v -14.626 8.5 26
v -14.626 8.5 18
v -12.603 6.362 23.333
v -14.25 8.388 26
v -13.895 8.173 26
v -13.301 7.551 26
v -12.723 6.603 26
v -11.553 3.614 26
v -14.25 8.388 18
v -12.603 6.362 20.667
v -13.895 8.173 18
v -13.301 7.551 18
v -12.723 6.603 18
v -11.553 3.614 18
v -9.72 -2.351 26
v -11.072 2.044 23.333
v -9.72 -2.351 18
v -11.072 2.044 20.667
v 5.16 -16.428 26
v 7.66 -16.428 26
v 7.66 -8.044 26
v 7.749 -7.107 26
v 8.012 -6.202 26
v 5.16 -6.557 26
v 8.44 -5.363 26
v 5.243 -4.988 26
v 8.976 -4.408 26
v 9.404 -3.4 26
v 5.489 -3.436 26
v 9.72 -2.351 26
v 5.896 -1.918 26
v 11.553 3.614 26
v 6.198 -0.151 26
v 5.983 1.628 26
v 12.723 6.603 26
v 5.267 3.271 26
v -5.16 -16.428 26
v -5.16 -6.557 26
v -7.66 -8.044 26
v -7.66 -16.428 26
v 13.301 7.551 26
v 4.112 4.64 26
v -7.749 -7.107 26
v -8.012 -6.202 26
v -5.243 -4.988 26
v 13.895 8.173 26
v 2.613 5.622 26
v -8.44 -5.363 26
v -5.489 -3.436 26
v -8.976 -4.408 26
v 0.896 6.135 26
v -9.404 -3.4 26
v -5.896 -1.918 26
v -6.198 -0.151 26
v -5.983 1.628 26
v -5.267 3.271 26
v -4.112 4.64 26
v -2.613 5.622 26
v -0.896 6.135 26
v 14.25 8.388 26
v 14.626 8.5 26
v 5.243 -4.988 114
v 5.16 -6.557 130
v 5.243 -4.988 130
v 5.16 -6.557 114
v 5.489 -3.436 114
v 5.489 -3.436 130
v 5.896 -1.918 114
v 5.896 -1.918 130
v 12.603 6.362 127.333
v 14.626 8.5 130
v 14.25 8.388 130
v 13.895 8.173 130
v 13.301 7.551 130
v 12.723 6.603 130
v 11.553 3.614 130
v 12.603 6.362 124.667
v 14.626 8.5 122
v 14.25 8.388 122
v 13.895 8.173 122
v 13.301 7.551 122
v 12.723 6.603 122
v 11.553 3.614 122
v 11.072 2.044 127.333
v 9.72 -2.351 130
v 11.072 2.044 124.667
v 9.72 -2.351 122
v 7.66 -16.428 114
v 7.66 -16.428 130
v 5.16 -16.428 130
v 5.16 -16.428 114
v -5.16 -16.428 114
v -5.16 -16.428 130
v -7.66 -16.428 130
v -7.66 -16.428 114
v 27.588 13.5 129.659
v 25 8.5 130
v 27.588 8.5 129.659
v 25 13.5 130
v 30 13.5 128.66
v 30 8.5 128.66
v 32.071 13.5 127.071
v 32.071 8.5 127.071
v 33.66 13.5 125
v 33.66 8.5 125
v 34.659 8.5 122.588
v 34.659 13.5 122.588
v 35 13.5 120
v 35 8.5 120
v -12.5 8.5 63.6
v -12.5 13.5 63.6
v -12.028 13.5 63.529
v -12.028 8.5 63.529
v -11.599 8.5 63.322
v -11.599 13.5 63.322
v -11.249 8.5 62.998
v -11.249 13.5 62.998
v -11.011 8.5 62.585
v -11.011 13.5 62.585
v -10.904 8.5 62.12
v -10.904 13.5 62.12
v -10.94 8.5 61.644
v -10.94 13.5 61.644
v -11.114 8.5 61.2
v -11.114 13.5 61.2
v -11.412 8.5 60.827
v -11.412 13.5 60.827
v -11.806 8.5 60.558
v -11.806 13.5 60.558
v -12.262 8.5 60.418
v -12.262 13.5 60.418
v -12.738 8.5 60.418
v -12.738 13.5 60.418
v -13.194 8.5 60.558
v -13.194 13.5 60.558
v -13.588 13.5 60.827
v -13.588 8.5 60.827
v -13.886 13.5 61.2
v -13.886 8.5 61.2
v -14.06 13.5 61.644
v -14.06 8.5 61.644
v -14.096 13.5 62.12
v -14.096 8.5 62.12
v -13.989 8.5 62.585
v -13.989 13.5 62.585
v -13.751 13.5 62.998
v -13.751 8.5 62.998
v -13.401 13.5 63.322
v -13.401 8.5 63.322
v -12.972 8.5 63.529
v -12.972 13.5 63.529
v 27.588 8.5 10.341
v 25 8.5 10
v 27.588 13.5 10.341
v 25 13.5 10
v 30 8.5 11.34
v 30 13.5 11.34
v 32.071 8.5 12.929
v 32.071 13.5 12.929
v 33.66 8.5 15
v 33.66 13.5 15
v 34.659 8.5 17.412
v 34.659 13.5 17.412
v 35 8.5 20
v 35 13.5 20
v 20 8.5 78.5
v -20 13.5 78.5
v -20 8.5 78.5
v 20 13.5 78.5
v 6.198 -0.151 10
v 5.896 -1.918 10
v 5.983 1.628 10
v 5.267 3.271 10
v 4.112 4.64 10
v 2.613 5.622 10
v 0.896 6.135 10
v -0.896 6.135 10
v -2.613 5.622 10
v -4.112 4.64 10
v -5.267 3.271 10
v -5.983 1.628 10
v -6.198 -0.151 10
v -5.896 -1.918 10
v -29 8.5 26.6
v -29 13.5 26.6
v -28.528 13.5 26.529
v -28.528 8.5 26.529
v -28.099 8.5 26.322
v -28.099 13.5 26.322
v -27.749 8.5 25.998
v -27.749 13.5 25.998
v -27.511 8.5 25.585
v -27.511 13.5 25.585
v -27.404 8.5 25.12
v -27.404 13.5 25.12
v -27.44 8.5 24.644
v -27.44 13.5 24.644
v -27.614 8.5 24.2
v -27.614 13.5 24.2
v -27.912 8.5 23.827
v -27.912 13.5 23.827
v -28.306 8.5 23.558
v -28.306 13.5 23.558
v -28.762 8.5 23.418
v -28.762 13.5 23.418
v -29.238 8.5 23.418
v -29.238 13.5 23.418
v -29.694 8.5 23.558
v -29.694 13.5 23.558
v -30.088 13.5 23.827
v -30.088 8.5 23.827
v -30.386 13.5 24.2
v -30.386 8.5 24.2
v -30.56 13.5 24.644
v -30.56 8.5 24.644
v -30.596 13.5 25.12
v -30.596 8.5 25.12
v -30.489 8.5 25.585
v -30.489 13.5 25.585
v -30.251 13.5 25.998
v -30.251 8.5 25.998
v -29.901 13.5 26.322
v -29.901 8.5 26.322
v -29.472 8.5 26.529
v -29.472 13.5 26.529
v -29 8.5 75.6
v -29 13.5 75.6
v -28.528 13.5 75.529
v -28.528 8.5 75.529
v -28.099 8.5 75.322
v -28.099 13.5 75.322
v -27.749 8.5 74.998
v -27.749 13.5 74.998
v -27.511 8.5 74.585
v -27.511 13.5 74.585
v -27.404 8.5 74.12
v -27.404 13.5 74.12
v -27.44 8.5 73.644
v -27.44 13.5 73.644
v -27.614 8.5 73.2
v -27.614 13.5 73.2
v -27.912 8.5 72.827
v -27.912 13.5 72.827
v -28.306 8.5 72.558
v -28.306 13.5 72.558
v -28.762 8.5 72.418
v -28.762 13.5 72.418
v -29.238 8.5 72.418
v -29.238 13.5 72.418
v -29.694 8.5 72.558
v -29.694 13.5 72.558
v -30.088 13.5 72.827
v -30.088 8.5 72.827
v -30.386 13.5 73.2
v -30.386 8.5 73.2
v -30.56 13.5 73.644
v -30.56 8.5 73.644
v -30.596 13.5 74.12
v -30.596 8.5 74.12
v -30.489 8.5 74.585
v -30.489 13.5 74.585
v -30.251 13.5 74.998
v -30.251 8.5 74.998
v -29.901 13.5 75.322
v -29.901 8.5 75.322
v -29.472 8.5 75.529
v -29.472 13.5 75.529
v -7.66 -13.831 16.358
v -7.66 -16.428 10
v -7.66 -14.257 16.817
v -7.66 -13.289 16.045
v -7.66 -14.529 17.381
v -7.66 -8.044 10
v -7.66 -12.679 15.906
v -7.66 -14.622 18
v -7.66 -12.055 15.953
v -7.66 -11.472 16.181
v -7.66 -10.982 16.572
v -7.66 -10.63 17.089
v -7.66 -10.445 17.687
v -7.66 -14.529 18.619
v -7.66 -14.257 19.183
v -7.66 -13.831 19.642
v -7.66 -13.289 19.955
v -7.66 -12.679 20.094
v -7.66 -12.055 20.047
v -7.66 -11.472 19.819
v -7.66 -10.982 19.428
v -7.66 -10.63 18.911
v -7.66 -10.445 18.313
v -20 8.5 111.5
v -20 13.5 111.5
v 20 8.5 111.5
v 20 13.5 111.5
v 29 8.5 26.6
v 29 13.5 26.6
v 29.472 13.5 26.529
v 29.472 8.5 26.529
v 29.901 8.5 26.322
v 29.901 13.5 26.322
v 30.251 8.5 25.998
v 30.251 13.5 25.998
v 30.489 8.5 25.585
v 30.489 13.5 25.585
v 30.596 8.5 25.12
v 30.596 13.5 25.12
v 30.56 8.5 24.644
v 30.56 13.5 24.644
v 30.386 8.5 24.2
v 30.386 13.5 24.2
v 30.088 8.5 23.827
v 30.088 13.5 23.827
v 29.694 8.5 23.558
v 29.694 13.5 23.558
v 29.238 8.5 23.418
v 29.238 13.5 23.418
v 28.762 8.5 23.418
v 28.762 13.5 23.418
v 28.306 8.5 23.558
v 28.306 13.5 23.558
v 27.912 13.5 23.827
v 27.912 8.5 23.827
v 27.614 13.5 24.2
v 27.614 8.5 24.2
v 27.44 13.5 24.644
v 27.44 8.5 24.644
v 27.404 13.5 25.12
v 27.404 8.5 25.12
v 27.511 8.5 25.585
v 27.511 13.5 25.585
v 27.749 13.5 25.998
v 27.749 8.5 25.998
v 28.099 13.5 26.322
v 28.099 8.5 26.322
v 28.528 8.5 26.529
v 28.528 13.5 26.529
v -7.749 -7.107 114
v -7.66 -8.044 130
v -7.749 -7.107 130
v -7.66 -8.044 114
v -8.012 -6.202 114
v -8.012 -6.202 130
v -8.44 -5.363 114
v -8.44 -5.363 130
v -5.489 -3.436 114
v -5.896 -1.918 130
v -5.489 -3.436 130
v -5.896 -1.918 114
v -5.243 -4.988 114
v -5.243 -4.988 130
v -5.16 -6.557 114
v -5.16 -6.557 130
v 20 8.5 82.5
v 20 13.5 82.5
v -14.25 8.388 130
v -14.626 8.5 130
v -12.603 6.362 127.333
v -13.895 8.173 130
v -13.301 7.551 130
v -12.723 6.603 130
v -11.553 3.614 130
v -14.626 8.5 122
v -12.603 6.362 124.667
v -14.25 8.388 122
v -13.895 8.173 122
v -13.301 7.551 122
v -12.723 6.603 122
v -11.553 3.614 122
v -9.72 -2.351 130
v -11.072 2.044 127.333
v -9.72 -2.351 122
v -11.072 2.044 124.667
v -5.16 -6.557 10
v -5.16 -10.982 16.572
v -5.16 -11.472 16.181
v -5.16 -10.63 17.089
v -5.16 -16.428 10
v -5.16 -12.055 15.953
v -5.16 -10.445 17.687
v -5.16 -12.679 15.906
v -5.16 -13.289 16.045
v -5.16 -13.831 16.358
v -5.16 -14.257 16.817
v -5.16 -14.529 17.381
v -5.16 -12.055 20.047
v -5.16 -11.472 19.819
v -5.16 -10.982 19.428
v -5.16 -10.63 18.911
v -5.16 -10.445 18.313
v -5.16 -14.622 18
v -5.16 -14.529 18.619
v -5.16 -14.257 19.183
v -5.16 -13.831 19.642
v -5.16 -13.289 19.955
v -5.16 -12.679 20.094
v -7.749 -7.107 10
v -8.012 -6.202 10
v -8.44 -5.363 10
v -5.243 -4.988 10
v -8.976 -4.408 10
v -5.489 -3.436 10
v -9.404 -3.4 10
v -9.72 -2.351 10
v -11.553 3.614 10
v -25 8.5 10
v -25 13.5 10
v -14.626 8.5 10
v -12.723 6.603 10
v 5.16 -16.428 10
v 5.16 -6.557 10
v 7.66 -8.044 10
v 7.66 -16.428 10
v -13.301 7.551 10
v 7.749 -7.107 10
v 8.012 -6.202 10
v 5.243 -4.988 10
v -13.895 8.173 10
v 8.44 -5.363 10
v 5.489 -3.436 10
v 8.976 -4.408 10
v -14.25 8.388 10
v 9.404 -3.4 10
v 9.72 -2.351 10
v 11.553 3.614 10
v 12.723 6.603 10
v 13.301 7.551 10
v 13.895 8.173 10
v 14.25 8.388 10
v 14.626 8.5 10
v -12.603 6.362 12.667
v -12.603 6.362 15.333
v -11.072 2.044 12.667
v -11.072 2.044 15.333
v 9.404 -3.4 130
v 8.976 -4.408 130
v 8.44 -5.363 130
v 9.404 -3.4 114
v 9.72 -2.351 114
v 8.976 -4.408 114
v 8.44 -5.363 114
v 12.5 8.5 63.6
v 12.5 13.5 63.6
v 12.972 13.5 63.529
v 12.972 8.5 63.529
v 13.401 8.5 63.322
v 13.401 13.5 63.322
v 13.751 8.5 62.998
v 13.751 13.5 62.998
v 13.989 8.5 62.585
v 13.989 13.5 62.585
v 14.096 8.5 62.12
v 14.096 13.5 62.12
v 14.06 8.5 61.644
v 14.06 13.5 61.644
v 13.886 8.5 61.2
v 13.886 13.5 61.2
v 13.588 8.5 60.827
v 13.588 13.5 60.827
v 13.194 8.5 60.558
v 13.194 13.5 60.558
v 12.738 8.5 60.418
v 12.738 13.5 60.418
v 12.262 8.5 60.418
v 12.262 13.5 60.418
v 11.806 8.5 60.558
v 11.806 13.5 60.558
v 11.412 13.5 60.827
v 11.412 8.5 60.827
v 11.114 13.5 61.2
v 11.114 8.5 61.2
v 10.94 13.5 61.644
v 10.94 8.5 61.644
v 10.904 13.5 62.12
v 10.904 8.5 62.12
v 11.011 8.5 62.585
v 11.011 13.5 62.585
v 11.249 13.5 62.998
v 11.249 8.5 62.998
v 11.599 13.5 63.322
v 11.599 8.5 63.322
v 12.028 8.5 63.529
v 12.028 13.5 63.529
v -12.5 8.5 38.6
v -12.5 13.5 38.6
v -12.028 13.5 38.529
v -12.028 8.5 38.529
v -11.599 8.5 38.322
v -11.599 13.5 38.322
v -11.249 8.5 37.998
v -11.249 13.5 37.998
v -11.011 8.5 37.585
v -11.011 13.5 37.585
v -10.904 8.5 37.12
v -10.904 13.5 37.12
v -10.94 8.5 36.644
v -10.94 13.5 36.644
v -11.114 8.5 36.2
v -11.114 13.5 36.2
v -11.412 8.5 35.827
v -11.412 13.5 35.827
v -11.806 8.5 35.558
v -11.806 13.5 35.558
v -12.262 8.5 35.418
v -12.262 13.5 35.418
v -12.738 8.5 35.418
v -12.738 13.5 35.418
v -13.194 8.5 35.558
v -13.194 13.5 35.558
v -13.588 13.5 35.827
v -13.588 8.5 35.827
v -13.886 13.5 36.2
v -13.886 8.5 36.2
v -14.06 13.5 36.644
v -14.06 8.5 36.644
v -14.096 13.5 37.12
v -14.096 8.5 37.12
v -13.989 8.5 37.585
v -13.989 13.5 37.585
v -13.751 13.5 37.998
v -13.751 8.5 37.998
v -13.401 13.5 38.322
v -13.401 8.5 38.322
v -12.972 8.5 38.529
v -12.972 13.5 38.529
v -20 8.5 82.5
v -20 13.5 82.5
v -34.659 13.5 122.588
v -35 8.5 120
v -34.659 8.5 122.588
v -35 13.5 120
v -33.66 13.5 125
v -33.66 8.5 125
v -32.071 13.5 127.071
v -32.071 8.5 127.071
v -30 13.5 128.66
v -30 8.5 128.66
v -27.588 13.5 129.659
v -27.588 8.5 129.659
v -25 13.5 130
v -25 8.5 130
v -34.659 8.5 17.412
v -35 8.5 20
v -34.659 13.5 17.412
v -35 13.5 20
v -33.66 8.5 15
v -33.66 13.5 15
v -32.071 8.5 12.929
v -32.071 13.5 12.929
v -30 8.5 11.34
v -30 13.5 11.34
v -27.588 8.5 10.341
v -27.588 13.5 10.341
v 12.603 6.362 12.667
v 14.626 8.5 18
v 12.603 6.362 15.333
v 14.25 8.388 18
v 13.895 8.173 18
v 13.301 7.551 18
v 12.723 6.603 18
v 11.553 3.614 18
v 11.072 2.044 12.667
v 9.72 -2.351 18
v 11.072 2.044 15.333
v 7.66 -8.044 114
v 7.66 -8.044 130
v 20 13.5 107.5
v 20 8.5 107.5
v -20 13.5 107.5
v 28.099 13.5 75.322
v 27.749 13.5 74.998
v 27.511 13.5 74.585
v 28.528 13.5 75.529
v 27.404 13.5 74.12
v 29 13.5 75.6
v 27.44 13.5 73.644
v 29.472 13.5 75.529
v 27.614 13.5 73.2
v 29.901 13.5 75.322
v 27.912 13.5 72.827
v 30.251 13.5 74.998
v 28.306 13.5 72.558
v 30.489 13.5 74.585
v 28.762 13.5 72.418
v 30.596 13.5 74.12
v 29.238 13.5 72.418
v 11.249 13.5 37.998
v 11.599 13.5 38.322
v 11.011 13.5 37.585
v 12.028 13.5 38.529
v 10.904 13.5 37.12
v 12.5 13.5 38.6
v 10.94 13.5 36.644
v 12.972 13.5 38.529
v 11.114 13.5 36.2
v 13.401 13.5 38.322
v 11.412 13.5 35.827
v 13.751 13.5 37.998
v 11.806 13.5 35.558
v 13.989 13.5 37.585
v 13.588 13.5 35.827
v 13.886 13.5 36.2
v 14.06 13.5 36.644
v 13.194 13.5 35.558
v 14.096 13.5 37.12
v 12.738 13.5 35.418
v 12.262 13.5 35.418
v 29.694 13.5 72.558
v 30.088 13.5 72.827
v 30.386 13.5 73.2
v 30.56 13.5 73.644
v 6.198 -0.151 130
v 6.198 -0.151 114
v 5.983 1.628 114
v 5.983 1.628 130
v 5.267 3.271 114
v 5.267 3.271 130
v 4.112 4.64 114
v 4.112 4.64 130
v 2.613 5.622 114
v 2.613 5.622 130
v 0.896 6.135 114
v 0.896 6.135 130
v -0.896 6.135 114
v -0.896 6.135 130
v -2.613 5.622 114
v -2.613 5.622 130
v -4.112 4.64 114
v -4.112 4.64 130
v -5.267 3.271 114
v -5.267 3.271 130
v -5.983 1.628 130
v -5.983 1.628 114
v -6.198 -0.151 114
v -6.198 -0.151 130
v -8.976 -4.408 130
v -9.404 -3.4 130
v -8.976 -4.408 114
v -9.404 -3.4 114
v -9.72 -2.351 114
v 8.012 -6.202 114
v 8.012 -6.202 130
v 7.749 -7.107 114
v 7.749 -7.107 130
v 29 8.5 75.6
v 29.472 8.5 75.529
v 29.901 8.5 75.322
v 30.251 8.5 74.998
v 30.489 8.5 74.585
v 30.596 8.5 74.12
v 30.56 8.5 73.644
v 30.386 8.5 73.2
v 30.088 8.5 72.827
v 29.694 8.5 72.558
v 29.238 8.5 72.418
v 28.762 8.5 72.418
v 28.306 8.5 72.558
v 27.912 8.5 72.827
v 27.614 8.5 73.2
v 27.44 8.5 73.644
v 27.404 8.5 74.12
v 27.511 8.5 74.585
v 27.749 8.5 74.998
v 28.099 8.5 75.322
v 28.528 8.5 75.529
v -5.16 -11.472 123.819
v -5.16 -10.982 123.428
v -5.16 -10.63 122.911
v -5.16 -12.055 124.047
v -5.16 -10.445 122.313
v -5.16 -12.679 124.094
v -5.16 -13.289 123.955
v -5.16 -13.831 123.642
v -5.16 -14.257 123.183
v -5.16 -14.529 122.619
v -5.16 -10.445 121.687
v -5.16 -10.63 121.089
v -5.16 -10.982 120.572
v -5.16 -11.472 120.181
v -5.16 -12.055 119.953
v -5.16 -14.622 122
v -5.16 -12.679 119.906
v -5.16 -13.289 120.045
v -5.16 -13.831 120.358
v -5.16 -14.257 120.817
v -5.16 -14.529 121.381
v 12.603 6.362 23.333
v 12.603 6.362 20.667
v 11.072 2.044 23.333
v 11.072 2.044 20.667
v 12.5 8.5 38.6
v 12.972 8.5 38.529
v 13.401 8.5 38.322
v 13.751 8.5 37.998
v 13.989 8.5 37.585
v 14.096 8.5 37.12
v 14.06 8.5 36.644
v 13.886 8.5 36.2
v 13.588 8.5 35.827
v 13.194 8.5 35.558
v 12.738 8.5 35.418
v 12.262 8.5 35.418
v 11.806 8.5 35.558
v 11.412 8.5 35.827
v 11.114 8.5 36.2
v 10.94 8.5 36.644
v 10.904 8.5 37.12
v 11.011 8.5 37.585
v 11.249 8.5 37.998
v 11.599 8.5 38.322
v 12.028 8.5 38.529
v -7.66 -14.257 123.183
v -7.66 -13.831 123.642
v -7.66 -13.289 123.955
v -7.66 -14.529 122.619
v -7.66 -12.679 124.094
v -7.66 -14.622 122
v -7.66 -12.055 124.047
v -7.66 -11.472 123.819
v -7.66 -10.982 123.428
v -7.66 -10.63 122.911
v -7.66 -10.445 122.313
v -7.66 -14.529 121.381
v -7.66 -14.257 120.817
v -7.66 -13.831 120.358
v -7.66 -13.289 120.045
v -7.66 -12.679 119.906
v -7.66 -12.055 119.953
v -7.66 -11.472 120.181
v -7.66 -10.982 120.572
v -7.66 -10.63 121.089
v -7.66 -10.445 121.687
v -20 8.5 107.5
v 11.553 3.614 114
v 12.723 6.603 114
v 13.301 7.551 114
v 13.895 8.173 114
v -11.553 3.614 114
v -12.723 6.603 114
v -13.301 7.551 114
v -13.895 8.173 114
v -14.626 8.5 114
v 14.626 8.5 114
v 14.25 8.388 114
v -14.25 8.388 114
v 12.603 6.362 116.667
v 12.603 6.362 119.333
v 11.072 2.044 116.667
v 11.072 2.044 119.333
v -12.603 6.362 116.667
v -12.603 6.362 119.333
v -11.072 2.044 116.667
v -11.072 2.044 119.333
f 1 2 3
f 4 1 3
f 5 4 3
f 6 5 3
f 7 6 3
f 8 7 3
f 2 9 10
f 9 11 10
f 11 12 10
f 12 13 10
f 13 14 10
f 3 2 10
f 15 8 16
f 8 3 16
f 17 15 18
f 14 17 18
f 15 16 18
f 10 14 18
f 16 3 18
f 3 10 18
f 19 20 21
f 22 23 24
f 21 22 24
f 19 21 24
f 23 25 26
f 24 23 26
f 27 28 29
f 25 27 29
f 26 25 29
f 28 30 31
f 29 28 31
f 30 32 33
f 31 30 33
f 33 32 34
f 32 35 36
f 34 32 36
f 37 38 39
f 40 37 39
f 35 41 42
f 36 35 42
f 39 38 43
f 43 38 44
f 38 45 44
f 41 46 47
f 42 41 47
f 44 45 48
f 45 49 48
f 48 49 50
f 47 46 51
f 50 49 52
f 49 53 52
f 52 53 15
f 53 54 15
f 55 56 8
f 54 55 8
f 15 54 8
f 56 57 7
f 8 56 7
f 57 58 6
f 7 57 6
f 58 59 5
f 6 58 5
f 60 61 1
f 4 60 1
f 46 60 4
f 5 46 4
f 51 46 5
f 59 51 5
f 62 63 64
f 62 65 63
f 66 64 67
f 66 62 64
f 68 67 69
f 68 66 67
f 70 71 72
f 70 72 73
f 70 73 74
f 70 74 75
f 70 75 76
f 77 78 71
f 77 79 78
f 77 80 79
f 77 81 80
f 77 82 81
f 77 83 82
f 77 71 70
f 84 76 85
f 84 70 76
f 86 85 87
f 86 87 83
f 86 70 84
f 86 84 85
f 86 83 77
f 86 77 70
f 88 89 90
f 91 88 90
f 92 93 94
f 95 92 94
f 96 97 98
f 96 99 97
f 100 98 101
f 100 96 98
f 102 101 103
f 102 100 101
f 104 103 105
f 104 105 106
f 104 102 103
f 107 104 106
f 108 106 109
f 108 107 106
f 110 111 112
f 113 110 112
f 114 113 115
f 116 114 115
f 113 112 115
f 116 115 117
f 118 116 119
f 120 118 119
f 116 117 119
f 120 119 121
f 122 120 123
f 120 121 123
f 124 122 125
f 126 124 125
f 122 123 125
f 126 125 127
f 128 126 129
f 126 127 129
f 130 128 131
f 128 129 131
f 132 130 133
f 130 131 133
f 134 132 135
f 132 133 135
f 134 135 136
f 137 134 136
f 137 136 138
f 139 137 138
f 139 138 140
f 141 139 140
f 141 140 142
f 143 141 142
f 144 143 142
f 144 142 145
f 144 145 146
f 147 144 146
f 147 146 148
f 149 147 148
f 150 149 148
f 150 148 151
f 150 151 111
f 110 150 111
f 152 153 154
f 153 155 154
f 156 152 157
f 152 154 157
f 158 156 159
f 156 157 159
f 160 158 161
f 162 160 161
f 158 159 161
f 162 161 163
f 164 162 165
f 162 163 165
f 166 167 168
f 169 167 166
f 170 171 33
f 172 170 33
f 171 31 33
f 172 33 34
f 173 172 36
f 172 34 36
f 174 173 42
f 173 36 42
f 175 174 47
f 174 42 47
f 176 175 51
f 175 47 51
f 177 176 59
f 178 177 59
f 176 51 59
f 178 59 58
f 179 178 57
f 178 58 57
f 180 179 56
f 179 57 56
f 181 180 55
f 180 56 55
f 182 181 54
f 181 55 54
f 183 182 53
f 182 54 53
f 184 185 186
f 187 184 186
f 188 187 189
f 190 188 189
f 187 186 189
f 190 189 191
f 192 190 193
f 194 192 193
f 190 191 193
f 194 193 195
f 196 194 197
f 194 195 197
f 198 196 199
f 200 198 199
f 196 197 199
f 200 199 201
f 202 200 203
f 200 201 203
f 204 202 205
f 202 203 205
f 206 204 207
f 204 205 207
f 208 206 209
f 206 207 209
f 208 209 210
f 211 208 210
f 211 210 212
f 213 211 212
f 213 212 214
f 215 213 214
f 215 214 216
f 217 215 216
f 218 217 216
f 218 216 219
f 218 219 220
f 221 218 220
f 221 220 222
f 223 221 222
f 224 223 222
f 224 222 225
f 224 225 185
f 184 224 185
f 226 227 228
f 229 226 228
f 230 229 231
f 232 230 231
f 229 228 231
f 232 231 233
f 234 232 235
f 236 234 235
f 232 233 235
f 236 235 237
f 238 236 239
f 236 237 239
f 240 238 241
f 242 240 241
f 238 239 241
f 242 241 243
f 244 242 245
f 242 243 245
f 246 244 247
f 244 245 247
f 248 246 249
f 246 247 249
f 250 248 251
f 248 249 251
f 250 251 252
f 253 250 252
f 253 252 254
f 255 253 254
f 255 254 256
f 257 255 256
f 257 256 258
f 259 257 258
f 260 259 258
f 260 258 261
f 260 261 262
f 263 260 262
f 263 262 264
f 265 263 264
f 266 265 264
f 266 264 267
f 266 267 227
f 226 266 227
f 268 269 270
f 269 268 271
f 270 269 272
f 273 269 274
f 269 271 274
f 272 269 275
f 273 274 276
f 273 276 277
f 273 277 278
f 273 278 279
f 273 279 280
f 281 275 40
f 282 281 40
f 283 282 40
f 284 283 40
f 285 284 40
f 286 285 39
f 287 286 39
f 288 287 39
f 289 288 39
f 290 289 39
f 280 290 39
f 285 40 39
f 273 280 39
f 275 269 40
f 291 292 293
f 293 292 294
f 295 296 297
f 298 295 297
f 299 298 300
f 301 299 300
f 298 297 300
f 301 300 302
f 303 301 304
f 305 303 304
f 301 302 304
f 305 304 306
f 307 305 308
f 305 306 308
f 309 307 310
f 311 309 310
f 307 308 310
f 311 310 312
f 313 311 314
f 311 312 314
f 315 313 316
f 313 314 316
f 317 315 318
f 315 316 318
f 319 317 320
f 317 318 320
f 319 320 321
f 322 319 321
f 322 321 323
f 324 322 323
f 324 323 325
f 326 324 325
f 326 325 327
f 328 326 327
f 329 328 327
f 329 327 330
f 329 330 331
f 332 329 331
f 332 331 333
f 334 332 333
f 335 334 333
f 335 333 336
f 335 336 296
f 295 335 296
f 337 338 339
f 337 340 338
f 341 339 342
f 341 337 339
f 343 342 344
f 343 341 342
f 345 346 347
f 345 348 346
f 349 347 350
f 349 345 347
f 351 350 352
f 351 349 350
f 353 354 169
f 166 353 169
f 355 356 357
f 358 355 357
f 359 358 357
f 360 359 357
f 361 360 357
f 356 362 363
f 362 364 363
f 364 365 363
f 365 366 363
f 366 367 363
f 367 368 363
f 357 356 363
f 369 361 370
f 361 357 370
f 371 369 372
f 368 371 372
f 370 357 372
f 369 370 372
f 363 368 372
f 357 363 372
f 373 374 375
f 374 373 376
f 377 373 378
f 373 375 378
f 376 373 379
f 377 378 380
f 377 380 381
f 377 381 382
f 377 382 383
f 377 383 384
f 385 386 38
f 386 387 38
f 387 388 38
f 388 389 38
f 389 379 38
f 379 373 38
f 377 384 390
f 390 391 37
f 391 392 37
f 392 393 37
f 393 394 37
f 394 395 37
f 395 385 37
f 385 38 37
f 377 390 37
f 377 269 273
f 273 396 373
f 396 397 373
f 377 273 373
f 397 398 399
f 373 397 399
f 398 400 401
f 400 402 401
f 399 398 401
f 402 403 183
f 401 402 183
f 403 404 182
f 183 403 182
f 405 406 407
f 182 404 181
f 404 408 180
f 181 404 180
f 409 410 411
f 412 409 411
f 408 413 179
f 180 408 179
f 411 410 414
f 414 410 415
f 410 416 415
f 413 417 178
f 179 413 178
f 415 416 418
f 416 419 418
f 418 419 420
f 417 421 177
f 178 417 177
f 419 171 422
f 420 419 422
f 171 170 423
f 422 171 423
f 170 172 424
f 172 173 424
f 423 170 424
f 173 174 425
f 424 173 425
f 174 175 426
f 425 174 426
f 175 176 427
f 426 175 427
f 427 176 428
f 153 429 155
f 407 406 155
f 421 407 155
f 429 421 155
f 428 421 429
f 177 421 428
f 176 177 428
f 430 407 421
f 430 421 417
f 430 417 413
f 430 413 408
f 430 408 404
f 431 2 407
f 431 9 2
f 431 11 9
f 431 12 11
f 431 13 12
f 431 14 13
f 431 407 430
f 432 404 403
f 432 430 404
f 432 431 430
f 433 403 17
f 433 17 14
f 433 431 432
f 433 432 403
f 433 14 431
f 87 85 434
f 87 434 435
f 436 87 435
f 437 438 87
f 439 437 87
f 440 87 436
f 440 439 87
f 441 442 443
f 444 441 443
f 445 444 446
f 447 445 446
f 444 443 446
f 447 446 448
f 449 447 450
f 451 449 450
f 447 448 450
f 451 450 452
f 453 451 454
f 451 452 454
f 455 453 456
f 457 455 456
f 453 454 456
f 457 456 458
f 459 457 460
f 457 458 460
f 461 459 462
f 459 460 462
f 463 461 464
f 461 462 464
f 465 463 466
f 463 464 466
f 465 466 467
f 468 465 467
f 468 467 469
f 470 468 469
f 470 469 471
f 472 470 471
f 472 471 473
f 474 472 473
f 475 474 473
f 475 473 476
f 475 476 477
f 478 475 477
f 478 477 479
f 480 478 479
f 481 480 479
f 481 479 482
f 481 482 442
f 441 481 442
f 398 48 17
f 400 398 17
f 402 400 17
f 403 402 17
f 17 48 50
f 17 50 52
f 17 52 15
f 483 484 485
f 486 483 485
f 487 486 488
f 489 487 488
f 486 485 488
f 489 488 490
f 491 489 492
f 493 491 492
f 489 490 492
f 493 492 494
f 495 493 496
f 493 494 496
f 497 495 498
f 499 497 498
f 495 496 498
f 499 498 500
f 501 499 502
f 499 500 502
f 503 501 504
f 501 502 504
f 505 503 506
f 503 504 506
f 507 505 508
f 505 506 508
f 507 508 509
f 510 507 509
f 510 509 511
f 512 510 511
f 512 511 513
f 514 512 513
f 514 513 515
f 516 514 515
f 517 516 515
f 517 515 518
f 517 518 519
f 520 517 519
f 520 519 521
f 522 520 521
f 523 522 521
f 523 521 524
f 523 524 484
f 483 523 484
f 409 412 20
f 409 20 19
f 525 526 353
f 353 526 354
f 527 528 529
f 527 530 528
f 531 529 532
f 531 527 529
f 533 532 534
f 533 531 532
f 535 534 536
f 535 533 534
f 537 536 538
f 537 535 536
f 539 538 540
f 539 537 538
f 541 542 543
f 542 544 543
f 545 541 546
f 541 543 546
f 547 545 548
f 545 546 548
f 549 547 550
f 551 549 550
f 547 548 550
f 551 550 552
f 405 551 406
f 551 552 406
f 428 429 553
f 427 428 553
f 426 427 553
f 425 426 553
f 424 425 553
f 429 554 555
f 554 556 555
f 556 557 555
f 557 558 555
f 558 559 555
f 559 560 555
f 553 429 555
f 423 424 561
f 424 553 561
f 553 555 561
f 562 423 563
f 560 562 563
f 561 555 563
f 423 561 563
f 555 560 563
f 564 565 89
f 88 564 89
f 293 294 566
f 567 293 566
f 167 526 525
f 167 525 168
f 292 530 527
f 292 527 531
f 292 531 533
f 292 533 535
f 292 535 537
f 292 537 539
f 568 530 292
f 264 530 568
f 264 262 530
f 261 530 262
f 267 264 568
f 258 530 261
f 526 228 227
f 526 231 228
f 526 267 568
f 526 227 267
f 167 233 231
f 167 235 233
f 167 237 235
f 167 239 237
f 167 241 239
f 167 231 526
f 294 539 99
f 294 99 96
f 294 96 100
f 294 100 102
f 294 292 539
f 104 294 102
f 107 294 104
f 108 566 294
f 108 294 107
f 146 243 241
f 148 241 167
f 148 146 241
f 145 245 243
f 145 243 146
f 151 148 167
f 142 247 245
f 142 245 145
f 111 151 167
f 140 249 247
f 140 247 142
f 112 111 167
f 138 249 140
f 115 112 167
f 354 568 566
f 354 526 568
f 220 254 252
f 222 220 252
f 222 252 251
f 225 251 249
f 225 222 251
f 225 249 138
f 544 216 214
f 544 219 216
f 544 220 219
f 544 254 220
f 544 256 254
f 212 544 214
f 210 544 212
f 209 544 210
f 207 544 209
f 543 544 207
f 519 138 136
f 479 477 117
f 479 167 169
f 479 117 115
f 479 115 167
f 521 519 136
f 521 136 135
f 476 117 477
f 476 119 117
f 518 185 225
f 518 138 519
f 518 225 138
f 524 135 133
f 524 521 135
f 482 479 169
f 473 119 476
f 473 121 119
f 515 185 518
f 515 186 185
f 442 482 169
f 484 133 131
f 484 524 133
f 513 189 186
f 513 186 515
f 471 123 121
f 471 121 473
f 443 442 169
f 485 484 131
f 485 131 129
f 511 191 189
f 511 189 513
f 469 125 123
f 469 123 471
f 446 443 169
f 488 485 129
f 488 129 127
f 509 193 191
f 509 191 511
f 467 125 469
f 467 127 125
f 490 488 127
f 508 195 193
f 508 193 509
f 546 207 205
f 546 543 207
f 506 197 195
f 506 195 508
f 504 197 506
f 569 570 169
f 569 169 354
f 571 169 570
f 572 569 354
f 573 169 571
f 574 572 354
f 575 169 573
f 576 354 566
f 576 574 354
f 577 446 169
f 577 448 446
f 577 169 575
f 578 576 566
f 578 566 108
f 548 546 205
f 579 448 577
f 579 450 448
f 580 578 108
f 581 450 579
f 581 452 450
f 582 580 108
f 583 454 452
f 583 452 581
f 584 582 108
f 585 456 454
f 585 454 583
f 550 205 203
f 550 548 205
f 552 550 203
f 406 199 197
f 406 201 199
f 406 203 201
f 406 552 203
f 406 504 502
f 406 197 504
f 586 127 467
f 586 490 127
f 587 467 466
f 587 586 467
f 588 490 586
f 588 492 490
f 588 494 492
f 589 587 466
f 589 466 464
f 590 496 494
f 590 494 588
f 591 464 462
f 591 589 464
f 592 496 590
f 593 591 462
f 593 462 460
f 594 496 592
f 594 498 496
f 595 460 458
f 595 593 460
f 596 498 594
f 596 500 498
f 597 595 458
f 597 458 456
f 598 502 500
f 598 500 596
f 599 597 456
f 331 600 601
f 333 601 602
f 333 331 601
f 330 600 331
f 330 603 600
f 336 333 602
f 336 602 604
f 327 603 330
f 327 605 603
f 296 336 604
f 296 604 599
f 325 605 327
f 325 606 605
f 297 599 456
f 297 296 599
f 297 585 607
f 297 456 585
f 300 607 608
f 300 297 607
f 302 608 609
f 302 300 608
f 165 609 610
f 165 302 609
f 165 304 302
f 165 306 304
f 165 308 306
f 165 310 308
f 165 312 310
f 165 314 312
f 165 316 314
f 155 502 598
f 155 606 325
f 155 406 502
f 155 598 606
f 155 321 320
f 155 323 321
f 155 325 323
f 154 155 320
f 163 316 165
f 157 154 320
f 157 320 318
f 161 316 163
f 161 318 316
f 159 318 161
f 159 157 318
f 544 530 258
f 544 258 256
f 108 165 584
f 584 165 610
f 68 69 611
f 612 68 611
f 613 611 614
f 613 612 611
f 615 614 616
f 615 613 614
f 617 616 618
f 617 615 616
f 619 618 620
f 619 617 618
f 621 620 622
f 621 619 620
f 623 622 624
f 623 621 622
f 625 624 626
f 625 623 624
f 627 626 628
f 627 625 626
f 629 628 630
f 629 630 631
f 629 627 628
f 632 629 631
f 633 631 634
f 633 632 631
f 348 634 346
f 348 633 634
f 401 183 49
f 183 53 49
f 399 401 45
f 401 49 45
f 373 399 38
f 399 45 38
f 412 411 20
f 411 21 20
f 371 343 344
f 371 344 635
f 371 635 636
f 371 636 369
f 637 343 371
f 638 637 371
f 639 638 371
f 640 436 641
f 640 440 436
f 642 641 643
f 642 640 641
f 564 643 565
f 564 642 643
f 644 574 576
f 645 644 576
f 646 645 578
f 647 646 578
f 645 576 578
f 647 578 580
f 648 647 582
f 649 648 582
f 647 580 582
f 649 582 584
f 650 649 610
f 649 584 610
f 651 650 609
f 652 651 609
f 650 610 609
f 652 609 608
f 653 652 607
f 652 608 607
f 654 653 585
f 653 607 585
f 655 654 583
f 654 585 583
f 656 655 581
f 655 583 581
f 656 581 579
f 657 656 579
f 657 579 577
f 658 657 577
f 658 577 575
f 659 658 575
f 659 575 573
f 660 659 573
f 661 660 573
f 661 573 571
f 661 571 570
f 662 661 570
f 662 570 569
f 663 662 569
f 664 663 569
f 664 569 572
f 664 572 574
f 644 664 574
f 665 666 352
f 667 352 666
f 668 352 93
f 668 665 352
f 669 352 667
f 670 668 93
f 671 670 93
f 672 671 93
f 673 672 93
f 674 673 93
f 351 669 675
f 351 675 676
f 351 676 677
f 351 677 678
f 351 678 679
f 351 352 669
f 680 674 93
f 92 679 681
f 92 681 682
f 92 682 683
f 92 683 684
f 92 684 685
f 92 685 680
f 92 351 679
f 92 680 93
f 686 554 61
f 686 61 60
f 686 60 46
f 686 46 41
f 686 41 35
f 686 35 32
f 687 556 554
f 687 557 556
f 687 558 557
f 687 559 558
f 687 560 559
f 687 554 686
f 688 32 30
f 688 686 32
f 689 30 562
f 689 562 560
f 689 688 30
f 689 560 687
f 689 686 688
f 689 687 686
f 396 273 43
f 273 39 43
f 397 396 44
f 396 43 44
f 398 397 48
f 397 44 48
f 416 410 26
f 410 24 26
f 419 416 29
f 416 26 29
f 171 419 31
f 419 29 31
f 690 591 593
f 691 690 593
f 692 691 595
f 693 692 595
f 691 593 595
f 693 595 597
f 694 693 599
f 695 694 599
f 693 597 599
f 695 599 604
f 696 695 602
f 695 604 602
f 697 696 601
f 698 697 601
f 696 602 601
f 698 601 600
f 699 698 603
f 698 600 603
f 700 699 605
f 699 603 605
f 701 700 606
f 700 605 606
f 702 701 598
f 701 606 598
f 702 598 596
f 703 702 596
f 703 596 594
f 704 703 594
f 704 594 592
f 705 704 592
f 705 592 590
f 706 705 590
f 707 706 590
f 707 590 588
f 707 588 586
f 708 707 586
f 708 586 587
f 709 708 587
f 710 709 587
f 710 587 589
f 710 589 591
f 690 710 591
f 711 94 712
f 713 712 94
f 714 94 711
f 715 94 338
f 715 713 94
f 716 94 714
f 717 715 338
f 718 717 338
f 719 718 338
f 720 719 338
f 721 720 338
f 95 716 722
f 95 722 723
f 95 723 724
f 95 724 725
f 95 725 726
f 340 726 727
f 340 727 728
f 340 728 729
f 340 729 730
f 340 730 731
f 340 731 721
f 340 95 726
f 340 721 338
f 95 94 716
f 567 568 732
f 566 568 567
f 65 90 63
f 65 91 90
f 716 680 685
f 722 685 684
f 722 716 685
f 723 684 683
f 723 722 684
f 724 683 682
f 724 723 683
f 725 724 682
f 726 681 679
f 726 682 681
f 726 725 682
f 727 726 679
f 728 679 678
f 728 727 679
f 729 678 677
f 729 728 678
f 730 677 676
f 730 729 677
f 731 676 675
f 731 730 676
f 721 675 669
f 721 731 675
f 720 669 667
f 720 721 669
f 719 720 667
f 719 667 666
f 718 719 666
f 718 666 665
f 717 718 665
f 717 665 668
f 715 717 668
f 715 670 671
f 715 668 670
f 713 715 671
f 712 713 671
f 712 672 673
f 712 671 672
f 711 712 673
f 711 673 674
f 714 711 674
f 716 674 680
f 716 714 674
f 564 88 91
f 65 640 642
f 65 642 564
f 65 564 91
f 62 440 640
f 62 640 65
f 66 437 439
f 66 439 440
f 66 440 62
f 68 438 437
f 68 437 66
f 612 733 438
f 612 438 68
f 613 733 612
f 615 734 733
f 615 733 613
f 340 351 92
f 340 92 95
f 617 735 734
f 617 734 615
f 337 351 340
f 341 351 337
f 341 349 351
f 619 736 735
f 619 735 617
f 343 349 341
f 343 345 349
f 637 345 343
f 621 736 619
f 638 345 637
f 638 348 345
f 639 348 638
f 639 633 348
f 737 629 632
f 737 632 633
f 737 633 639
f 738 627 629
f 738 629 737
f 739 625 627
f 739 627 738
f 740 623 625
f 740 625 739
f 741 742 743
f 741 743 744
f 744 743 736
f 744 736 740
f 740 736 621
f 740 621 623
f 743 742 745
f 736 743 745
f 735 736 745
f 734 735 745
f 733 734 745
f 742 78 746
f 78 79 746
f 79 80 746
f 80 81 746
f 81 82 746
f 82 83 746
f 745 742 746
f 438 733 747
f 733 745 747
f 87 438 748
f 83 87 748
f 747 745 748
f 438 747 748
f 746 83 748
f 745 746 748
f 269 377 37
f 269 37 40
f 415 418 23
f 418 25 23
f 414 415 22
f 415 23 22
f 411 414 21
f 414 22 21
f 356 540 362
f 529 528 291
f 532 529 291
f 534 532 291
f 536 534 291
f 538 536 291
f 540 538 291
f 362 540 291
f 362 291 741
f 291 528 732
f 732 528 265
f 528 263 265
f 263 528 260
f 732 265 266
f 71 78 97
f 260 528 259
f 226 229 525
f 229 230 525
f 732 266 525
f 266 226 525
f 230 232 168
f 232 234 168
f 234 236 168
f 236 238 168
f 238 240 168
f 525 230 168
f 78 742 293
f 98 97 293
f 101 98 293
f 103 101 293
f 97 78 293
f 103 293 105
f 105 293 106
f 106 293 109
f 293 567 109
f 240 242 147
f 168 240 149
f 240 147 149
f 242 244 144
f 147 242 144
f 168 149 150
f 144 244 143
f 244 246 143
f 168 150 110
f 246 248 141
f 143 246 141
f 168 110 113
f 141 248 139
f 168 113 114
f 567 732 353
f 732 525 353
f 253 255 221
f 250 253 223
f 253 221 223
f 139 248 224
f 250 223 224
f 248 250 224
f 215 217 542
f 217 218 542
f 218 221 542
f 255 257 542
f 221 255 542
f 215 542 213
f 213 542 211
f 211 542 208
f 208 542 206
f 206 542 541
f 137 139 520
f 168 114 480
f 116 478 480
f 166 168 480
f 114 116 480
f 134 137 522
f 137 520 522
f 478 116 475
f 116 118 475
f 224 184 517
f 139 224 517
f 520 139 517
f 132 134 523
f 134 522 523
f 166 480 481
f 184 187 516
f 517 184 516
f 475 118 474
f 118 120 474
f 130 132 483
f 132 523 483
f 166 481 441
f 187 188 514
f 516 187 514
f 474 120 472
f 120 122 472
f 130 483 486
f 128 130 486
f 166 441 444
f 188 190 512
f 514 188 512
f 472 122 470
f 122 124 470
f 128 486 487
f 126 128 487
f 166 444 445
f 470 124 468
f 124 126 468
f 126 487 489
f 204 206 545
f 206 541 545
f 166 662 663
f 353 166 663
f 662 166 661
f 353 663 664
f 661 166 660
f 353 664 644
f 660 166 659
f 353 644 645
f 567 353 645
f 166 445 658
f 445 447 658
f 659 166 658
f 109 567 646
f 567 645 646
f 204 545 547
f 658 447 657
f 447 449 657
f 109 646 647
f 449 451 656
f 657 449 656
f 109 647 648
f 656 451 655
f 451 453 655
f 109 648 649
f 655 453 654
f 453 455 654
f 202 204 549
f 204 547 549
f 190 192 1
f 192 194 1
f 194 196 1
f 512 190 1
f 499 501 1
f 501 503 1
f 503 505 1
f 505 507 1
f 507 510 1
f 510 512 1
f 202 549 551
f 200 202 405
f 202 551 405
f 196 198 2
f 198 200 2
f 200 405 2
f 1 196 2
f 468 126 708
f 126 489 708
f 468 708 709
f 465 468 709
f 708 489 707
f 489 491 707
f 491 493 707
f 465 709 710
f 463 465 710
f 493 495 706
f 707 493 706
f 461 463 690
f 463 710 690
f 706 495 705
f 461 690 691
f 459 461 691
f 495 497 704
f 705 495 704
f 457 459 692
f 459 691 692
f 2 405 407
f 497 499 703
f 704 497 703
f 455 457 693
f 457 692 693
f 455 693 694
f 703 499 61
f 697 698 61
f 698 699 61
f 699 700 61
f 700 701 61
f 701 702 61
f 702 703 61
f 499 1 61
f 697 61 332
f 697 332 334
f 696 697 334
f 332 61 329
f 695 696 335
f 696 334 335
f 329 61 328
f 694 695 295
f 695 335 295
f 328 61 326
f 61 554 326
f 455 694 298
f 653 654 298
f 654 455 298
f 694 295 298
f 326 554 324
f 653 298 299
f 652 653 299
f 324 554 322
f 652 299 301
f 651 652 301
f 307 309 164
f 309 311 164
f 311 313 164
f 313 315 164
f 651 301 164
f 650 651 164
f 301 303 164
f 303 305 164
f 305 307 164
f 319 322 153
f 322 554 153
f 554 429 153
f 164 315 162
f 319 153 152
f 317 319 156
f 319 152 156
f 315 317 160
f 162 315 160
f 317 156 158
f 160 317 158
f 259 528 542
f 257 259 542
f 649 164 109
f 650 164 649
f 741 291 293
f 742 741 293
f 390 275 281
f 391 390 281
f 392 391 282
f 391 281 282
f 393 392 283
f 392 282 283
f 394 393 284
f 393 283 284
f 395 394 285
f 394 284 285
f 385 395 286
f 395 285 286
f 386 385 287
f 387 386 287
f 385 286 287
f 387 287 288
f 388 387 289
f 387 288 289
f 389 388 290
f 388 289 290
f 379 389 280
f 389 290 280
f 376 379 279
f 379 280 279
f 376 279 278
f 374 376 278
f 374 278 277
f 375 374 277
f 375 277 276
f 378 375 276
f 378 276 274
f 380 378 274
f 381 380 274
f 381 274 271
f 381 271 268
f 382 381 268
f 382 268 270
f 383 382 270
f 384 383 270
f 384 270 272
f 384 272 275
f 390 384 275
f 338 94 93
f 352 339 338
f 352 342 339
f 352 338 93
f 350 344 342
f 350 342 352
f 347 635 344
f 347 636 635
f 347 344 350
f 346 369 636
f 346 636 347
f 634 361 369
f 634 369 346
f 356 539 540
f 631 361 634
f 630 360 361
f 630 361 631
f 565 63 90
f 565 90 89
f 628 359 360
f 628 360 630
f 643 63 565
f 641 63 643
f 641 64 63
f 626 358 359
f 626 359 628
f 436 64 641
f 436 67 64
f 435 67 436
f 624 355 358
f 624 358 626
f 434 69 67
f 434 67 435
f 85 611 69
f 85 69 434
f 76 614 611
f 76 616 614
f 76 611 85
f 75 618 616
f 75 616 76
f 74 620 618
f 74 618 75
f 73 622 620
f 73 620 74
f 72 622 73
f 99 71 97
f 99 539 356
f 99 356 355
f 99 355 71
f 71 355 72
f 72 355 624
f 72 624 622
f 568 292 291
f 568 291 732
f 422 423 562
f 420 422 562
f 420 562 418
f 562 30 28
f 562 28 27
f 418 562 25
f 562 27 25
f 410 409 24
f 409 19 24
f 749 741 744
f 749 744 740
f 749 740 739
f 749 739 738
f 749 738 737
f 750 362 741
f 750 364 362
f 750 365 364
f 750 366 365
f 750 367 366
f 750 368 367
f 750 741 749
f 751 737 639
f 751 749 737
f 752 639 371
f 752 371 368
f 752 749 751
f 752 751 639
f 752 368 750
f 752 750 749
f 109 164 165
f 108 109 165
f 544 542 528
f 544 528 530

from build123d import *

# Parameters (mm, degrees)
BOSS_EXTRUDE2_START = 10
SKETCH3_W           = 70
SKETCH3_H           = 5
BOSS_EXTRUDE2_DEPTH = 120
BOSS_EXTRUDE3_START = 18
BOSS_EXTRUDE3_DEPTH = 8
SKETCH4_R           = 2.1
CUT_EXTRUDE1_DEPTH  = 11
FILLET1_R           = 10
SKETCH5_R           = 1.6
CUT_EXTRUDE2_DEPTH  = 11
CUT_EXTRUDE5_REACH  = 139.915
SKETCH7_R           = 1.6
CUT_EXTRUDE6_REACH  = 139.915
SKETCH6_W           = 40
SKETCH6_H           = 4


with BuildPart() as part:
    # Sketch3 → Boss-Extrude2 (new body)
    with BuildSketch(Plane.XY.offset(BOSS_EXTRUDE2_START)):
        with Locations((0, 11)):
            Rectangle(SKETCH3_W, SKETCH3_H)
    extrude(amount=BOSS_EXTRUDE2_DEPTH)

    # Sketch1 → Boss-Extrude3 (add, symmetric)
    with BuildSketch(Plane.XY.offset(BOSS_EXTRUDE3_START)):
        with BuildLine():
            Line((-14.625621312, 8.5), (14.625621312, 8.5))
            add(Edge.make_bspline(
                [(14.625621312, 8.5), (12.253002272, 8.152861079), (11.086674652, 1.382068579), (9.719671925, -2.351165174)],
                knots=[0, 0, 0, 0, 1, 1, 1, 1], degree=3))
            ThreePointArc((9.719671925, -2.351165174), (9.204012528, -3.909751064), (8.440296287, -5.362965465))
            ThreePointArc((8.440296287, -5.362965465), (7.859364307, -6.648156809), (7.660444431, -8.044448198))
            Line((7.660444431, -8.044448198), (7.660444431, -16.427876097))
            Line((7.660444431, -16.427876097), (6.160444431, -16.427876097))
            Line((6.160444431, -16.427876097), (5.160444431, -16.427876097))
            Line((5.160444431, -16.427876097), (5.160444431, -6.557170147))
            ThreePointArc((5.160444431, -6.557170147), (5.34546922, -4.208445066), (5.895979032, -1.917662968))
            ThreePointArc((5.895979032, -1.917662968), (0, 6.2), (-5.895979032, -1.917662968))
            ThreePointArc((-5.895979032, -1.917662968), (-5.34546922, -4.208445066), (-5.160444431, -6.557170147))
            Line((-5.160444431, -6.557170147), (-5.160444431, -16.427876097))
            Line((-5.160444431, -16.427876097), (-6.160444431, -16.427876097))
            Line((-6.160444431, -16.427876097), (-7.660444431, -16.427876097))
            Line((-7.660444431, -16.427876097), (-7.660444431, -8.044448198))
            ThreePointArc((-7.660444431, -8.044448198), (-7.859364307, -6.648156809), (-8.440296287, -5.362965465))
            ThreePointArc((-8.440296287, -5.362965465), (-9.204012528, -3.909751064), (-9.719671925, -2.351165174))
            add(Edge.make_bspline(
                [(-14.625621312, 8.5), (-12.253002272, 8.152861079), (-11.086674652, 1.382068579), (-9.719671925, -2.351165174)],
                knots=[0, 0, 0, 0, 1, 1, 1, 1], degree=3))
        make_face()
    boss_extrude3 = extrude(amount=BOSS_EXTRUDE3_DEPTH, both=True)

    # Sketch4 → Cut-Extrude1 (cut)
    with BuildSketch(Plane.ZY.offset(7.660444431)):
        with Locations(Location((18, -12.521824291, 0), (0, 0, 270))):
            Circle(SKETCH4_R)
    cut_extrude1 = extrude(amount=-CUT_EXTRUDE1_DEPTH, mode=Mode.SUBTRACT)

    # Mirror2: Boss-Extrude3, Cut-Extrude1 across plane
    add(boss_extrude3.mirror(Plane.XY.offset(70)))
    add(cut_extrude1.mirror(Plane.XY.offset(70)), mode=Mode.SUBTRACT)

    # Fillet1
    fillet1_edges = [part.edges().sort_by_distance(p)[0] for p in [
        (-35, 11, 130),
        (35, 11, 130),
        (-35, 11, 10),
        (35, 11, 10),
    ]]
    fillet(fillet1_edges, radius=FILLET1_R)

    # Sketch5 → Cut-Extrude2 (cut)
    with BuildSketch(Plane(origin=(0, 13.5, 0), x_dir=(1, 0, 0), z_dir=(0, 1, 0))):
        with Locations(Location((29, -25, 0), (0, 0, 270))):
            Circle(SKETCH5_R)
        with Locations(Location((29, -74, 0), (0, 0, 270))):
            Circle(SKETCH5_R)
        with Locations(Location((-29, -74, 0), (0, 0, 270))):
            Circle(SKETCH5_R)
        with Locations(Location((-29, -25, 0), (0, 0, 270))):
            Circle(SKETCH5_R)
    extrude(amount=-CUT_EXTRUDE2_DEPTH, mode=Mode.SUBTRACT)

    # Sketch7 → Cut-Extrude5 (cut, up to next)
    with BuildSketch(Plane(origin=(0, 13.5, 0), x_dir=(1, 0, 0), z_dir=(0, 1, 0)), mode=Mode.PRIVATE) as cut_extrude5_sk1:
        with Locations(Location((12.5, -37, 0), (0, 0, 270))):
            Circle(SKETCH7_R)
    cut_extrude5_tool1 = extrude(cut_extrude5_sk1.sketch, amount=-CUT_EXTRUDE5_REACH, mode=Mode.PRIVATE) & part.part
    # Sketch7 → Cut-Extrude5 (cut, up to next)
    with BuildSketch(Plane(origin=(0, 13.5, 0), x_dir=(1, 0, 0), z_dir=(0, 1, 0)), mode=Mode.PRIVATE) as cut_extrude5_sk2:
        with Locations(Location((12.5, -62, 0), (0, 0, 270))):
            Circle(SKETCH7_R)
    cut_extrude5_tool2 = extrude(cut_extrude5_sk2.sketch, amount=-CUT_EXTRUDE5_REACH, mode=Mode.PRIVATE) & part.part
    # Sketch7 → Cut-Extrude5 (cut, up to next)
    with BuildSketch(Plane(origin=(0, 13.5, 0), x_dir=(1, 0, 0), z_dir=(0, 1, 0)), mode=Mode.PRIVATE) as cut_extrude5_sk3:
        with Locations(Location((-12.5, -62, 0), (0, 0, 270))):
            Circle(SKETCH7_R)
    cut_extrude5_tool3 = extrude(cut_extrude5_sk3.sketch, amount=-CUT_EXTRUDE5_REACH, mode=Mode.PRIVATE) & part.part
    # Sketch7 → Cut-Extrude5 (cut, up to next)
    with BuildSketch(Plane(origin=(0, 13.5, 0), x_dir=(1, 0, 0), z_dir=(0, 1, 0)), mode=Mode.PRIVATE) as cut_extrude5_sk4:
        with Locations(Location((-12.5, -37, 0), (0, 0, 270))):
            Circle(SKETCH7_R)
    cut_extrude5_tool4 = extrude(cut_extrude5_sk4.sketch, amount=-CUT_EXTRUDE5_REACH, mode=Mode.PRIVATE) & part.part
    add(cut_extrude5_tool1.solids().sort_by_distance((12.5, 13.5, 37))[0], mode=Mode.SUBTRACT)
    add(cut_extrude5_tool2.solids().sort_by_distance((12.5, 13.5, 62))[0], mode=Mode.SUBTRACT)
    add(cut_extrude5_tool3.solids().sort_by_distance((-12.5, 13.5, 62))[0], mode=Mode.SUBTRACT)
    add(cut_extrude5_tool4.solids().sort_by_distance((-12.5, 13.5, 37))[0], mode=Mode.SUBTRACT)

    # Sketch6 → Cut-Extrude6 (cut, up to next)
    with BuildSketch(Plane(origin=(0, 13.5, 0), x_dir=(1, 0, 0), z_dir=(0, 1, 0)), mode=Mode.PRIVATE) as cut_extrude6_sk1:
        with Locations((0, -80.5)):
            Rectangle(SKETCH6_W, SKETCH6_H)
    cut_extrude6_tool1 = extrude(cut_extrude6_sk1.sketch, amount=-CUT_EXTRUDE6_REACH, mode=Mode.PRIVATE) & part.part
    # Sketch6 → Cut-Extrude6 (cut, up to next)
    with BuildSketch(Plane(origin=(0, 13.5, 0), x_dir=(1, 0, 0), z_dir=(0, 1, 0)), mode=Mode.PRIVATE) as cut_extrude6_sk2:
        with Locations((0, -109.5)):
            Rectangle(SKETCH6_W, SKETCH6_H)
    cut_extrude6_tool2 = extrude(cut_extrude6_sk2.sketch, amount=-CUT_EXTRUDE6_REACH, mode=Mode.PRIVATE) & part.part
    add(cut_extrude6_tool1.solids().sort_by_distance((0, 13.5, 80.5))[0], mode=Mode.SUBTRACT)
    add(cut_extrude6_tool2.solids().sort_by_distance((0, 13.5, 109.5))[0], mode=Mode.SUBTRACT)


solid = part.part
